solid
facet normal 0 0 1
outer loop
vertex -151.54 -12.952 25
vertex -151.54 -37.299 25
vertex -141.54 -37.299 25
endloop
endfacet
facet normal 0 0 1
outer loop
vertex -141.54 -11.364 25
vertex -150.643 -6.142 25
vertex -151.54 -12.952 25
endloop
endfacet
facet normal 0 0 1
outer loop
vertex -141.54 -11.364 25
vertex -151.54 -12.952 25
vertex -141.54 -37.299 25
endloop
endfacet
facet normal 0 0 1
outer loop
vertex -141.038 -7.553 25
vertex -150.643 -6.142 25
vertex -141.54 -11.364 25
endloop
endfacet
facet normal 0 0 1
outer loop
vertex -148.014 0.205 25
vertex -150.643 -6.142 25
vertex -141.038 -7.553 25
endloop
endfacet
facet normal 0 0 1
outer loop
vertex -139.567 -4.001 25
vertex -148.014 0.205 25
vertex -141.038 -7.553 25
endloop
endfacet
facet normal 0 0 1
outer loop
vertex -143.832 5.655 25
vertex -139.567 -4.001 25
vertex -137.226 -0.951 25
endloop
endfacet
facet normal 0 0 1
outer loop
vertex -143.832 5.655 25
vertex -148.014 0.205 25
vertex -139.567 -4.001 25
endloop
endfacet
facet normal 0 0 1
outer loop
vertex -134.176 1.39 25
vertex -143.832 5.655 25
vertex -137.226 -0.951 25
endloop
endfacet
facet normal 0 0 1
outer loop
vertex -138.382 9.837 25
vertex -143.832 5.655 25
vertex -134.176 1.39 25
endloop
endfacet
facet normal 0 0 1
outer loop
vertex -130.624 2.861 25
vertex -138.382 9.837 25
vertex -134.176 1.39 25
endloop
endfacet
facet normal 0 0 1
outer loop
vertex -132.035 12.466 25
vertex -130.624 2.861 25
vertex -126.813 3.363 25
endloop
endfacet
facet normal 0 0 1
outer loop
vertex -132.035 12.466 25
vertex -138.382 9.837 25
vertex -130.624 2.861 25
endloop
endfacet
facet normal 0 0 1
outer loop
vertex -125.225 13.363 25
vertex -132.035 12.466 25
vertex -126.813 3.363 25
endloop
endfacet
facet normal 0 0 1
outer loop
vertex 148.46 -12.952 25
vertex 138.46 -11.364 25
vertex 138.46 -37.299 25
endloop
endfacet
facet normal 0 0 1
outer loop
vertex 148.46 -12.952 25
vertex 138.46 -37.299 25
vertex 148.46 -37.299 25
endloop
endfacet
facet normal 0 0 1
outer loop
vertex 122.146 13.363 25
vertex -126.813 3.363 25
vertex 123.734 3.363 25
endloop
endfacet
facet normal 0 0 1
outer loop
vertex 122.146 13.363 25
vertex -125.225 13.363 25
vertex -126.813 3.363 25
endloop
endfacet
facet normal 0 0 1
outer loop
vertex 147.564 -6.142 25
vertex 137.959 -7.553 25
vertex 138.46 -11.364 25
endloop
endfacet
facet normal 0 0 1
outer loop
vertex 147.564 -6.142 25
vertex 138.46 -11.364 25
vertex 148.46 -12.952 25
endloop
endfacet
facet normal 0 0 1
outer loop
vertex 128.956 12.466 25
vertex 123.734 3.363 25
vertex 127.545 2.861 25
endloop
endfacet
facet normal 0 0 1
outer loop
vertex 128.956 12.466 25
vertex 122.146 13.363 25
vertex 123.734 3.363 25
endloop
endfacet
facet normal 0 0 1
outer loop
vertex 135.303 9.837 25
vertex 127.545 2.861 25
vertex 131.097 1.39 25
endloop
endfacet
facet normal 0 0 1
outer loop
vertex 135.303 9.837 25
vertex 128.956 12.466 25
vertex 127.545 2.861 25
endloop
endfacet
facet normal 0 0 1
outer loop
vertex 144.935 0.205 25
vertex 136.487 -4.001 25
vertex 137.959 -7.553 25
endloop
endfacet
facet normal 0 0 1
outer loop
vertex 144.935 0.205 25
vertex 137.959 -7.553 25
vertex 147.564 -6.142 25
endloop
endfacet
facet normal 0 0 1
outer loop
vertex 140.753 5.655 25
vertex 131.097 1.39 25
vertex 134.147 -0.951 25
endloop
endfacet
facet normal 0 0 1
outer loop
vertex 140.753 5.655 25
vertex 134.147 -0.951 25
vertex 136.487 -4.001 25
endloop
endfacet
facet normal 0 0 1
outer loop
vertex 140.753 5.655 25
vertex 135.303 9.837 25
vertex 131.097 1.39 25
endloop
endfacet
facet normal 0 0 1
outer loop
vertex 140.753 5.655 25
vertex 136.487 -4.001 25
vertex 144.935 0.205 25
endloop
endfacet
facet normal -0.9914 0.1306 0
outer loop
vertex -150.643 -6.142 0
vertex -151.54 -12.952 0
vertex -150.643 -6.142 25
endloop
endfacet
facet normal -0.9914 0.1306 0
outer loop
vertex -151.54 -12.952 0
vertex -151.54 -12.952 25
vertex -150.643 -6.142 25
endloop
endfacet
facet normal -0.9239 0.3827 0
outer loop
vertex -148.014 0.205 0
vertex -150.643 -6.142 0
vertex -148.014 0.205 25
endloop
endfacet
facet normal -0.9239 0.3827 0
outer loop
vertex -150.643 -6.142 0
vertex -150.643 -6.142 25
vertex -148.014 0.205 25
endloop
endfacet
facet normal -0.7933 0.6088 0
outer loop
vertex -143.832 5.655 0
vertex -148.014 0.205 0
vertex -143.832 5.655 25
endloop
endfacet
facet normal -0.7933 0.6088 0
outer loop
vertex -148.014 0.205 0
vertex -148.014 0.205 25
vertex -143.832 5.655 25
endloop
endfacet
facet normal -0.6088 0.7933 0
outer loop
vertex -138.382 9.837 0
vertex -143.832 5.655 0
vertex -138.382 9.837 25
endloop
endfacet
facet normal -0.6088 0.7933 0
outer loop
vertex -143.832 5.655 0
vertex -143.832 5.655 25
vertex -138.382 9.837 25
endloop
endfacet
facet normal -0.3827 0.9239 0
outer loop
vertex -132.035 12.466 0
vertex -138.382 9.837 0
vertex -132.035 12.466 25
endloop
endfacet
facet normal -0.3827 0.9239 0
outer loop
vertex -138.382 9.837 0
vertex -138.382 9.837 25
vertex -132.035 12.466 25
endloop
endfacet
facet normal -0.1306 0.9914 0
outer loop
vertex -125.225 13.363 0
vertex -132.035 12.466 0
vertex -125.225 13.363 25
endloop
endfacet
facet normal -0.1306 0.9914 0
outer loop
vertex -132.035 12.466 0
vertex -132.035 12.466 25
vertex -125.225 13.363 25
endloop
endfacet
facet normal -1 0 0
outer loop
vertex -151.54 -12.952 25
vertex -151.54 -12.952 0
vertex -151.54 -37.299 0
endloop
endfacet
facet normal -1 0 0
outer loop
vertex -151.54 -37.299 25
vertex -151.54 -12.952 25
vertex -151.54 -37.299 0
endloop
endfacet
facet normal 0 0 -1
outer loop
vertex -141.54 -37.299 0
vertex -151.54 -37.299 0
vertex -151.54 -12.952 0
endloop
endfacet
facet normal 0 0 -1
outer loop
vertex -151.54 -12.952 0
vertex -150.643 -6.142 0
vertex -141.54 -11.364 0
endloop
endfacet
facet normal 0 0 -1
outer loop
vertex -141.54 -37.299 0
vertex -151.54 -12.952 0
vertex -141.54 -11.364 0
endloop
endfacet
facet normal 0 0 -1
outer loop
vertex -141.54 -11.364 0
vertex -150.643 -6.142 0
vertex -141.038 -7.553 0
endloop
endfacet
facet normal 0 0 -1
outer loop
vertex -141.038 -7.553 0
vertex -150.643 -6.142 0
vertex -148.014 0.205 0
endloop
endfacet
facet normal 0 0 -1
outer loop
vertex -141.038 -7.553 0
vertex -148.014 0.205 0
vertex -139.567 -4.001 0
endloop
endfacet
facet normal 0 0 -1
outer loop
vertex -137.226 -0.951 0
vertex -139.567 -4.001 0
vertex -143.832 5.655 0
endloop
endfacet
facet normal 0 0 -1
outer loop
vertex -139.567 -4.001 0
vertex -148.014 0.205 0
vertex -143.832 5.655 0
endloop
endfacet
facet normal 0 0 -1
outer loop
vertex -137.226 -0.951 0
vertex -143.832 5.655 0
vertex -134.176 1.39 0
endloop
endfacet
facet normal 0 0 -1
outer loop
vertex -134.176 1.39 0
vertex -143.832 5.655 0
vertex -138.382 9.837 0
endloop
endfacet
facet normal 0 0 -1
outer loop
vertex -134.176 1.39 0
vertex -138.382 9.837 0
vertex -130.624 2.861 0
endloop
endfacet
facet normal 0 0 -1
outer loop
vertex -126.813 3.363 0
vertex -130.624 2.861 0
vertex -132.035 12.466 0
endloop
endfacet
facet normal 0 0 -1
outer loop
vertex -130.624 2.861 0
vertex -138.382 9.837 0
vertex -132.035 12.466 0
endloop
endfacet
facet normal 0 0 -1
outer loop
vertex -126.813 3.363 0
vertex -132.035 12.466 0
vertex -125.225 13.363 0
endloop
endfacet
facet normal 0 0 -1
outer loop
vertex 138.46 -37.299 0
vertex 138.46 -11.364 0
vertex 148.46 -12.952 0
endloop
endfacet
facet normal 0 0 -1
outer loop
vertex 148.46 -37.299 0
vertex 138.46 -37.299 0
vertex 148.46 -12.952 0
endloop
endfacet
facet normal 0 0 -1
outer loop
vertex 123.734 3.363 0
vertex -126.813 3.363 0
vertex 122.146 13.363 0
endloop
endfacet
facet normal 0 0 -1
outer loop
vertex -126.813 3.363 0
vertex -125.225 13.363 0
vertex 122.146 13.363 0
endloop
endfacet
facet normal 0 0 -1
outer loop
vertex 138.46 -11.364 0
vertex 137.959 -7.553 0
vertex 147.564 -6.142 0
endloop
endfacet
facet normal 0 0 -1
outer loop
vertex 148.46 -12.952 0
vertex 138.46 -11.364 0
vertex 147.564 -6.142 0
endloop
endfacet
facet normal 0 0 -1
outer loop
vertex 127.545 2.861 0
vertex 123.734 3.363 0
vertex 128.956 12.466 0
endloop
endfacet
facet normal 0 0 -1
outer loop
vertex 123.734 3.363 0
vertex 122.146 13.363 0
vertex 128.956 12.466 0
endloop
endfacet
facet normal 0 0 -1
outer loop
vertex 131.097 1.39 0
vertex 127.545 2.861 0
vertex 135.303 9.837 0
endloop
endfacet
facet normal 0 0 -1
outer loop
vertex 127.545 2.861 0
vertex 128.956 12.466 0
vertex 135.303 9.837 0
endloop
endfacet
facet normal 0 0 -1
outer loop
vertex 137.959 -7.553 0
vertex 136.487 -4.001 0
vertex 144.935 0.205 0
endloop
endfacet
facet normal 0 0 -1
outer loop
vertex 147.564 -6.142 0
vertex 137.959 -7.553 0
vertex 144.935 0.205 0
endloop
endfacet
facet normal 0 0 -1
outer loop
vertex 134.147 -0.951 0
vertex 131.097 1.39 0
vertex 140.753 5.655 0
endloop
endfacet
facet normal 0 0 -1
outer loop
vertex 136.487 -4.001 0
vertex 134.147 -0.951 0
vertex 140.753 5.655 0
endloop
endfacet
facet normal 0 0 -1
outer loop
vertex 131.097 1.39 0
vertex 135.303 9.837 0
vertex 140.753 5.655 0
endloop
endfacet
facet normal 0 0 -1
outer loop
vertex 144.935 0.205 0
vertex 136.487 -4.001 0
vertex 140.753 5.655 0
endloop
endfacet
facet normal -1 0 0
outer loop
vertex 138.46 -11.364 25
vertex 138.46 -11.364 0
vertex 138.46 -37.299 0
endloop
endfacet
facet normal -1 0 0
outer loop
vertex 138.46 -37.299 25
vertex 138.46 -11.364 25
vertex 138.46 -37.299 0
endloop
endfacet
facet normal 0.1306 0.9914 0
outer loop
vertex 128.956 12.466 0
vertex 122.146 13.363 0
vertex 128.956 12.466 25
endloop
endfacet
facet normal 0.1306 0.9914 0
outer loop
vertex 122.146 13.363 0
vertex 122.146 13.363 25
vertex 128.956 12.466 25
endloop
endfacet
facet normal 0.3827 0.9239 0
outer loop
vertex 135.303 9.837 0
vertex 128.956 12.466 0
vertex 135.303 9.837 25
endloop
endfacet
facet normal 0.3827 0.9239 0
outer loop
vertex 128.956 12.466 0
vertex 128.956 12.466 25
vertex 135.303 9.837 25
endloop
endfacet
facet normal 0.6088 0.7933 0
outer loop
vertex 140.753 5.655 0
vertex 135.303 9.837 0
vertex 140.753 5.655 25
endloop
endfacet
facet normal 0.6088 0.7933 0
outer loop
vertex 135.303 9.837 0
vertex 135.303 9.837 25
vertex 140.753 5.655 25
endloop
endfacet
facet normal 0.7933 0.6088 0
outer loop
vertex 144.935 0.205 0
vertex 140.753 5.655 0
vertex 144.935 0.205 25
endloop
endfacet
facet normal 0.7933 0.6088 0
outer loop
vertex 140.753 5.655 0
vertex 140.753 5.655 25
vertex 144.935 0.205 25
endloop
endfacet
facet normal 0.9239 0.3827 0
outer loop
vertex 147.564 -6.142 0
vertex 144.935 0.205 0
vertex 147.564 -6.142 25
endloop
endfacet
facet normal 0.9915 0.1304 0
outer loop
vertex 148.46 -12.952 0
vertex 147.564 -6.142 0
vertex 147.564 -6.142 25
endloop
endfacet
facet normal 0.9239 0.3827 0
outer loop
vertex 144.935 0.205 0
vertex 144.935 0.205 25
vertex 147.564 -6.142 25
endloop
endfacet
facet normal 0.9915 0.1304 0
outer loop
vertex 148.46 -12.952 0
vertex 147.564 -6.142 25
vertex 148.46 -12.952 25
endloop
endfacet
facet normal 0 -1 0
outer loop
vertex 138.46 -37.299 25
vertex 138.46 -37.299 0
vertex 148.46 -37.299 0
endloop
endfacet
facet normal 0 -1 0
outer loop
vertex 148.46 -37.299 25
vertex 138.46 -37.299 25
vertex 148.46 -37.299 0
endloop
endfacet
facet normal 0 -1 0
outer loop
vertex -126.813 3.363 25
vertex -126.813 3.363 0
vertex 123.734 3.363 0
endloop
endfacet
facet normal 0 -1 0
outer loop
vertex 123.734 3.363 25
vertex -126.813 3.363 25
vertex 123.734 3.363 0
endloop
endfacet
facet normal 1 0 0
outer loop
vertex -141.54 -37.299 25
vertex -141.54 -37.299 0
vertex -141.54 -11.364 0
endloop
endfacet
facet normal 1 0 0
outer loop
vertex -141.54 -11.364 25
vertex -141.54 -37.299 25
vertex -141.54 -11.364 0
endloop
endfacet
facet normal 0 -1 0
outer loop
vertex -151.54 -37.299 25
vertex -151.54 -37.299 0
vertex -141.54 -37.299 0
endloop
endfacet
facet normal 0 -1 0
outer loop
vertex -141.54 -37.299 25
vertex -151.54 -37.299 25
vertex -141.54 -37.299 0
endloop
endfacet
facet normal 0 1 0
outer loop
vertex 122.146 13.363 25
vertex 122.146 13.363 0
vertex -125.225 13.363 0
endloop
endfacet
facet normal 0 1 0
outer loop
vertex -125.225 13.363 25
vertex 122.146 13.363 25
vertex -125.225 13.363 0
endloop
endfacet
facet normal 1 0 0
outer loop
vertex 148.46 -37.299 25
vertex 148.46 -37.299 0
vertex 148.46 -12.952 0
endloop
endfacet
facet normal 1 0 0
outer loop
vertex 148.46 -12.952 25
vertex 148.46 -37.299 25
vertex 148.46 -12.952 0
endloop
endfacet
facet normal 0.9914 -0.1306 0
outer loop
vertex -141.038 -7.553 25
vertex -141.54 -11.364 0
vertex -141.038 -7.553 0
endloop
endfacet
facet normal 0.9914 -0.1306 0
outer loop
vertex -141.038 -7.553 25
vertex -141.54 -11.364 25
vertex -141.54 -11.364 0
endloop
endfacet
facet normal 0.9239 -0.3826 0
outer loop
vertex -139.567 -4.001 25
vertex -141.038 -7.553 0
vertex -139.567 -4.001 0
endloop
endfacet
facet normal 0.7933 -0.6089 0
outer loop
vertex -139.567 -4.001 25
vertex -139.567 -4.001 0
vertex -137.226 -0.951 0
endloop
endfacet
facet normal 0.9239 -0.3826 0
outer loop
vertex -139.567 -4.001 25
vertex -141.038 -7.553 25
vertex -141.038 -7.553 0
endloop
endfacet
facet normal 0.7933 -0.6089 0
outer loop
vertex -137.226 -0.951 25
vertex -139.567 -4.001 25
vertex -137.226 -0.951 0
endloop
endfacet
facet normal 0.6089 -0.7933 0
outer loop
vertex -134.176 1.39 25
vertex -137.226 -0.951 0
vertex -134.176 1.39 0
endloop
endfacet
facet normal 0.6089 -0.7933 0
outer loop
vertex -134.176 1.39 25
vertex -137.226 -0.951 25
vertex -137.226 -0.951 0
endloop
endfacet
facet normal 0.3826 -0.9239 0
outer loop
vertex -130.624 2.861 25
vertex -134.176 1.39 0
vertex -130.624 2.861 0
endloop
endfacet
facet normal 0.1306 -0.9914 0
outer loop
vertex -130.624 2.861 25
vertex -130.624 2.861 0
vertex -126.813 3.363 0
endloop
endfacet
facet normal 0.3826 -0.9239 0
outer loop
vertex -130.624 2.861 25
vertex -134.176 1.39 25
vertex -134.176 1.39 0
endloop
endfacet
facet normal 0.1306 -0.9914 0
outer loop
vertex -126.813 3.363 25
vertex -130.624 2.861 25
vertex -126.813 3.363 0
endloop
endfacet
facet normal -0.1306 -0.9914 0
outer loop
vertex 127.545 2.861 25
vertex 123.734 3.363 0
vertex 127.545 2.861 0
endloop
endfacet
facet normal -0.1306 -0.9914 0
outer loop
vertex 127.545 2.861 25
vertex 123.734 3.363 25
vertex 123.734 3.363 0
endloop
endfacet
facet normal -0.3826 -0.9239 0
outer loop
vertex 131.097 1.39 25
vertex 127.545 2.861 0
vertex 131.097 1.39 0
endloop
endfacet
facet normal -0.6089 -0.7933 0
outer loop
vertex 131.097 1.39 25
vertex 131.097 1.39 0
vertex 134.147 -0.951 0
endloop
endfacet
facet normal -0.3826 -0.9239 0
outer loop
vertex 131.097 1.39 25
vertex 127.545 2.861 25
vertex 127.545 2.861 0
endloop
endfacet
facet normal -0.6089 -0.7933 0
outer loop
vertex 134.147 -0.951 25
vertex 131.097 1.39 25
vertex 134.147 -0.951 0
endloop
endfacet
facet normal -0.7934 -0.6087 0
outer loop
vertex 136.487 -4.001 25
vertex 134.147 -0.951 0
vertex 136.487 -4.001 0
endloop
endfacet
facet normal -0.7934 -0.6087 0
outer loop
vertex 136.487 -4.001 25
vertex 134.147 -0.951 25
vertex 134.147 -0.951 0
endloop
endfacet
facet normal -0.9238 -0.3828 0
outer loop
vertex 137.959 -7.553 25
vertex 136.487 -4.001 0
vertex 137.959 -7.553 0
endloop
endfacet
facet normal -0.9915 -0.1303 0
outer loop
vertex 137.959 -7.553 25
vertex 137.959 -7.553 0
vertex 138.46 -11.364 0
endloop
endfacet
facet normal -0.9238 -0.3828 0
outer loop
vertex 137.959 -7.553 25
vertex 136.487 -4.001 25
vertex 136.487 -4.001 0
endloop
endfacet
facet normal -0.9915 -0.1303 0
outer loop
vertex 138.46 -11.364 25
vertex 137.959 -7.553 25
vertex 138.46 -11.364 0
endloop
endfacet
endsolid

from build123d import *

# Parameters (mm, degrees)
F1_DEPTH = 25
F2_R     = 14.726703
F3_R     = 26.314928


with BuildPart() as f1:
    # F0 (on Top) → F1 (new body)
    with BuildSketch(Plane.XY):
        Polygon((148.460492, 13.362525), (-151.539508, 13.362525), (-151.539508, -37.299059), (-141.539508, -37.299059), (-141.539508, 3.362525), (138.460492, 3.362525), (138.460492, -37.299059), (148.460492, -37.299059), align=None)
    extrude(amount=F1_DEPTH)

    # F2
    f2_edges = [f1.edges().sort_by_distance(p)[0] for p in [
        (-141.539508, 3.362525, 12.5),
        (138.460492, 3.362525, 12.5),
    ]]
    fillet(f2_edges, radius=F2_R)

    # F3
    f3_edges = [f1.edges().sort_by_distance(p)[0] for p in [
        (-151.539508, 13.362525, 12.5),
        (148.460492, 13.362525, 12.5),
    ]]
    fillet(f3_edges, radius=F3_R)


solid = f1.part
